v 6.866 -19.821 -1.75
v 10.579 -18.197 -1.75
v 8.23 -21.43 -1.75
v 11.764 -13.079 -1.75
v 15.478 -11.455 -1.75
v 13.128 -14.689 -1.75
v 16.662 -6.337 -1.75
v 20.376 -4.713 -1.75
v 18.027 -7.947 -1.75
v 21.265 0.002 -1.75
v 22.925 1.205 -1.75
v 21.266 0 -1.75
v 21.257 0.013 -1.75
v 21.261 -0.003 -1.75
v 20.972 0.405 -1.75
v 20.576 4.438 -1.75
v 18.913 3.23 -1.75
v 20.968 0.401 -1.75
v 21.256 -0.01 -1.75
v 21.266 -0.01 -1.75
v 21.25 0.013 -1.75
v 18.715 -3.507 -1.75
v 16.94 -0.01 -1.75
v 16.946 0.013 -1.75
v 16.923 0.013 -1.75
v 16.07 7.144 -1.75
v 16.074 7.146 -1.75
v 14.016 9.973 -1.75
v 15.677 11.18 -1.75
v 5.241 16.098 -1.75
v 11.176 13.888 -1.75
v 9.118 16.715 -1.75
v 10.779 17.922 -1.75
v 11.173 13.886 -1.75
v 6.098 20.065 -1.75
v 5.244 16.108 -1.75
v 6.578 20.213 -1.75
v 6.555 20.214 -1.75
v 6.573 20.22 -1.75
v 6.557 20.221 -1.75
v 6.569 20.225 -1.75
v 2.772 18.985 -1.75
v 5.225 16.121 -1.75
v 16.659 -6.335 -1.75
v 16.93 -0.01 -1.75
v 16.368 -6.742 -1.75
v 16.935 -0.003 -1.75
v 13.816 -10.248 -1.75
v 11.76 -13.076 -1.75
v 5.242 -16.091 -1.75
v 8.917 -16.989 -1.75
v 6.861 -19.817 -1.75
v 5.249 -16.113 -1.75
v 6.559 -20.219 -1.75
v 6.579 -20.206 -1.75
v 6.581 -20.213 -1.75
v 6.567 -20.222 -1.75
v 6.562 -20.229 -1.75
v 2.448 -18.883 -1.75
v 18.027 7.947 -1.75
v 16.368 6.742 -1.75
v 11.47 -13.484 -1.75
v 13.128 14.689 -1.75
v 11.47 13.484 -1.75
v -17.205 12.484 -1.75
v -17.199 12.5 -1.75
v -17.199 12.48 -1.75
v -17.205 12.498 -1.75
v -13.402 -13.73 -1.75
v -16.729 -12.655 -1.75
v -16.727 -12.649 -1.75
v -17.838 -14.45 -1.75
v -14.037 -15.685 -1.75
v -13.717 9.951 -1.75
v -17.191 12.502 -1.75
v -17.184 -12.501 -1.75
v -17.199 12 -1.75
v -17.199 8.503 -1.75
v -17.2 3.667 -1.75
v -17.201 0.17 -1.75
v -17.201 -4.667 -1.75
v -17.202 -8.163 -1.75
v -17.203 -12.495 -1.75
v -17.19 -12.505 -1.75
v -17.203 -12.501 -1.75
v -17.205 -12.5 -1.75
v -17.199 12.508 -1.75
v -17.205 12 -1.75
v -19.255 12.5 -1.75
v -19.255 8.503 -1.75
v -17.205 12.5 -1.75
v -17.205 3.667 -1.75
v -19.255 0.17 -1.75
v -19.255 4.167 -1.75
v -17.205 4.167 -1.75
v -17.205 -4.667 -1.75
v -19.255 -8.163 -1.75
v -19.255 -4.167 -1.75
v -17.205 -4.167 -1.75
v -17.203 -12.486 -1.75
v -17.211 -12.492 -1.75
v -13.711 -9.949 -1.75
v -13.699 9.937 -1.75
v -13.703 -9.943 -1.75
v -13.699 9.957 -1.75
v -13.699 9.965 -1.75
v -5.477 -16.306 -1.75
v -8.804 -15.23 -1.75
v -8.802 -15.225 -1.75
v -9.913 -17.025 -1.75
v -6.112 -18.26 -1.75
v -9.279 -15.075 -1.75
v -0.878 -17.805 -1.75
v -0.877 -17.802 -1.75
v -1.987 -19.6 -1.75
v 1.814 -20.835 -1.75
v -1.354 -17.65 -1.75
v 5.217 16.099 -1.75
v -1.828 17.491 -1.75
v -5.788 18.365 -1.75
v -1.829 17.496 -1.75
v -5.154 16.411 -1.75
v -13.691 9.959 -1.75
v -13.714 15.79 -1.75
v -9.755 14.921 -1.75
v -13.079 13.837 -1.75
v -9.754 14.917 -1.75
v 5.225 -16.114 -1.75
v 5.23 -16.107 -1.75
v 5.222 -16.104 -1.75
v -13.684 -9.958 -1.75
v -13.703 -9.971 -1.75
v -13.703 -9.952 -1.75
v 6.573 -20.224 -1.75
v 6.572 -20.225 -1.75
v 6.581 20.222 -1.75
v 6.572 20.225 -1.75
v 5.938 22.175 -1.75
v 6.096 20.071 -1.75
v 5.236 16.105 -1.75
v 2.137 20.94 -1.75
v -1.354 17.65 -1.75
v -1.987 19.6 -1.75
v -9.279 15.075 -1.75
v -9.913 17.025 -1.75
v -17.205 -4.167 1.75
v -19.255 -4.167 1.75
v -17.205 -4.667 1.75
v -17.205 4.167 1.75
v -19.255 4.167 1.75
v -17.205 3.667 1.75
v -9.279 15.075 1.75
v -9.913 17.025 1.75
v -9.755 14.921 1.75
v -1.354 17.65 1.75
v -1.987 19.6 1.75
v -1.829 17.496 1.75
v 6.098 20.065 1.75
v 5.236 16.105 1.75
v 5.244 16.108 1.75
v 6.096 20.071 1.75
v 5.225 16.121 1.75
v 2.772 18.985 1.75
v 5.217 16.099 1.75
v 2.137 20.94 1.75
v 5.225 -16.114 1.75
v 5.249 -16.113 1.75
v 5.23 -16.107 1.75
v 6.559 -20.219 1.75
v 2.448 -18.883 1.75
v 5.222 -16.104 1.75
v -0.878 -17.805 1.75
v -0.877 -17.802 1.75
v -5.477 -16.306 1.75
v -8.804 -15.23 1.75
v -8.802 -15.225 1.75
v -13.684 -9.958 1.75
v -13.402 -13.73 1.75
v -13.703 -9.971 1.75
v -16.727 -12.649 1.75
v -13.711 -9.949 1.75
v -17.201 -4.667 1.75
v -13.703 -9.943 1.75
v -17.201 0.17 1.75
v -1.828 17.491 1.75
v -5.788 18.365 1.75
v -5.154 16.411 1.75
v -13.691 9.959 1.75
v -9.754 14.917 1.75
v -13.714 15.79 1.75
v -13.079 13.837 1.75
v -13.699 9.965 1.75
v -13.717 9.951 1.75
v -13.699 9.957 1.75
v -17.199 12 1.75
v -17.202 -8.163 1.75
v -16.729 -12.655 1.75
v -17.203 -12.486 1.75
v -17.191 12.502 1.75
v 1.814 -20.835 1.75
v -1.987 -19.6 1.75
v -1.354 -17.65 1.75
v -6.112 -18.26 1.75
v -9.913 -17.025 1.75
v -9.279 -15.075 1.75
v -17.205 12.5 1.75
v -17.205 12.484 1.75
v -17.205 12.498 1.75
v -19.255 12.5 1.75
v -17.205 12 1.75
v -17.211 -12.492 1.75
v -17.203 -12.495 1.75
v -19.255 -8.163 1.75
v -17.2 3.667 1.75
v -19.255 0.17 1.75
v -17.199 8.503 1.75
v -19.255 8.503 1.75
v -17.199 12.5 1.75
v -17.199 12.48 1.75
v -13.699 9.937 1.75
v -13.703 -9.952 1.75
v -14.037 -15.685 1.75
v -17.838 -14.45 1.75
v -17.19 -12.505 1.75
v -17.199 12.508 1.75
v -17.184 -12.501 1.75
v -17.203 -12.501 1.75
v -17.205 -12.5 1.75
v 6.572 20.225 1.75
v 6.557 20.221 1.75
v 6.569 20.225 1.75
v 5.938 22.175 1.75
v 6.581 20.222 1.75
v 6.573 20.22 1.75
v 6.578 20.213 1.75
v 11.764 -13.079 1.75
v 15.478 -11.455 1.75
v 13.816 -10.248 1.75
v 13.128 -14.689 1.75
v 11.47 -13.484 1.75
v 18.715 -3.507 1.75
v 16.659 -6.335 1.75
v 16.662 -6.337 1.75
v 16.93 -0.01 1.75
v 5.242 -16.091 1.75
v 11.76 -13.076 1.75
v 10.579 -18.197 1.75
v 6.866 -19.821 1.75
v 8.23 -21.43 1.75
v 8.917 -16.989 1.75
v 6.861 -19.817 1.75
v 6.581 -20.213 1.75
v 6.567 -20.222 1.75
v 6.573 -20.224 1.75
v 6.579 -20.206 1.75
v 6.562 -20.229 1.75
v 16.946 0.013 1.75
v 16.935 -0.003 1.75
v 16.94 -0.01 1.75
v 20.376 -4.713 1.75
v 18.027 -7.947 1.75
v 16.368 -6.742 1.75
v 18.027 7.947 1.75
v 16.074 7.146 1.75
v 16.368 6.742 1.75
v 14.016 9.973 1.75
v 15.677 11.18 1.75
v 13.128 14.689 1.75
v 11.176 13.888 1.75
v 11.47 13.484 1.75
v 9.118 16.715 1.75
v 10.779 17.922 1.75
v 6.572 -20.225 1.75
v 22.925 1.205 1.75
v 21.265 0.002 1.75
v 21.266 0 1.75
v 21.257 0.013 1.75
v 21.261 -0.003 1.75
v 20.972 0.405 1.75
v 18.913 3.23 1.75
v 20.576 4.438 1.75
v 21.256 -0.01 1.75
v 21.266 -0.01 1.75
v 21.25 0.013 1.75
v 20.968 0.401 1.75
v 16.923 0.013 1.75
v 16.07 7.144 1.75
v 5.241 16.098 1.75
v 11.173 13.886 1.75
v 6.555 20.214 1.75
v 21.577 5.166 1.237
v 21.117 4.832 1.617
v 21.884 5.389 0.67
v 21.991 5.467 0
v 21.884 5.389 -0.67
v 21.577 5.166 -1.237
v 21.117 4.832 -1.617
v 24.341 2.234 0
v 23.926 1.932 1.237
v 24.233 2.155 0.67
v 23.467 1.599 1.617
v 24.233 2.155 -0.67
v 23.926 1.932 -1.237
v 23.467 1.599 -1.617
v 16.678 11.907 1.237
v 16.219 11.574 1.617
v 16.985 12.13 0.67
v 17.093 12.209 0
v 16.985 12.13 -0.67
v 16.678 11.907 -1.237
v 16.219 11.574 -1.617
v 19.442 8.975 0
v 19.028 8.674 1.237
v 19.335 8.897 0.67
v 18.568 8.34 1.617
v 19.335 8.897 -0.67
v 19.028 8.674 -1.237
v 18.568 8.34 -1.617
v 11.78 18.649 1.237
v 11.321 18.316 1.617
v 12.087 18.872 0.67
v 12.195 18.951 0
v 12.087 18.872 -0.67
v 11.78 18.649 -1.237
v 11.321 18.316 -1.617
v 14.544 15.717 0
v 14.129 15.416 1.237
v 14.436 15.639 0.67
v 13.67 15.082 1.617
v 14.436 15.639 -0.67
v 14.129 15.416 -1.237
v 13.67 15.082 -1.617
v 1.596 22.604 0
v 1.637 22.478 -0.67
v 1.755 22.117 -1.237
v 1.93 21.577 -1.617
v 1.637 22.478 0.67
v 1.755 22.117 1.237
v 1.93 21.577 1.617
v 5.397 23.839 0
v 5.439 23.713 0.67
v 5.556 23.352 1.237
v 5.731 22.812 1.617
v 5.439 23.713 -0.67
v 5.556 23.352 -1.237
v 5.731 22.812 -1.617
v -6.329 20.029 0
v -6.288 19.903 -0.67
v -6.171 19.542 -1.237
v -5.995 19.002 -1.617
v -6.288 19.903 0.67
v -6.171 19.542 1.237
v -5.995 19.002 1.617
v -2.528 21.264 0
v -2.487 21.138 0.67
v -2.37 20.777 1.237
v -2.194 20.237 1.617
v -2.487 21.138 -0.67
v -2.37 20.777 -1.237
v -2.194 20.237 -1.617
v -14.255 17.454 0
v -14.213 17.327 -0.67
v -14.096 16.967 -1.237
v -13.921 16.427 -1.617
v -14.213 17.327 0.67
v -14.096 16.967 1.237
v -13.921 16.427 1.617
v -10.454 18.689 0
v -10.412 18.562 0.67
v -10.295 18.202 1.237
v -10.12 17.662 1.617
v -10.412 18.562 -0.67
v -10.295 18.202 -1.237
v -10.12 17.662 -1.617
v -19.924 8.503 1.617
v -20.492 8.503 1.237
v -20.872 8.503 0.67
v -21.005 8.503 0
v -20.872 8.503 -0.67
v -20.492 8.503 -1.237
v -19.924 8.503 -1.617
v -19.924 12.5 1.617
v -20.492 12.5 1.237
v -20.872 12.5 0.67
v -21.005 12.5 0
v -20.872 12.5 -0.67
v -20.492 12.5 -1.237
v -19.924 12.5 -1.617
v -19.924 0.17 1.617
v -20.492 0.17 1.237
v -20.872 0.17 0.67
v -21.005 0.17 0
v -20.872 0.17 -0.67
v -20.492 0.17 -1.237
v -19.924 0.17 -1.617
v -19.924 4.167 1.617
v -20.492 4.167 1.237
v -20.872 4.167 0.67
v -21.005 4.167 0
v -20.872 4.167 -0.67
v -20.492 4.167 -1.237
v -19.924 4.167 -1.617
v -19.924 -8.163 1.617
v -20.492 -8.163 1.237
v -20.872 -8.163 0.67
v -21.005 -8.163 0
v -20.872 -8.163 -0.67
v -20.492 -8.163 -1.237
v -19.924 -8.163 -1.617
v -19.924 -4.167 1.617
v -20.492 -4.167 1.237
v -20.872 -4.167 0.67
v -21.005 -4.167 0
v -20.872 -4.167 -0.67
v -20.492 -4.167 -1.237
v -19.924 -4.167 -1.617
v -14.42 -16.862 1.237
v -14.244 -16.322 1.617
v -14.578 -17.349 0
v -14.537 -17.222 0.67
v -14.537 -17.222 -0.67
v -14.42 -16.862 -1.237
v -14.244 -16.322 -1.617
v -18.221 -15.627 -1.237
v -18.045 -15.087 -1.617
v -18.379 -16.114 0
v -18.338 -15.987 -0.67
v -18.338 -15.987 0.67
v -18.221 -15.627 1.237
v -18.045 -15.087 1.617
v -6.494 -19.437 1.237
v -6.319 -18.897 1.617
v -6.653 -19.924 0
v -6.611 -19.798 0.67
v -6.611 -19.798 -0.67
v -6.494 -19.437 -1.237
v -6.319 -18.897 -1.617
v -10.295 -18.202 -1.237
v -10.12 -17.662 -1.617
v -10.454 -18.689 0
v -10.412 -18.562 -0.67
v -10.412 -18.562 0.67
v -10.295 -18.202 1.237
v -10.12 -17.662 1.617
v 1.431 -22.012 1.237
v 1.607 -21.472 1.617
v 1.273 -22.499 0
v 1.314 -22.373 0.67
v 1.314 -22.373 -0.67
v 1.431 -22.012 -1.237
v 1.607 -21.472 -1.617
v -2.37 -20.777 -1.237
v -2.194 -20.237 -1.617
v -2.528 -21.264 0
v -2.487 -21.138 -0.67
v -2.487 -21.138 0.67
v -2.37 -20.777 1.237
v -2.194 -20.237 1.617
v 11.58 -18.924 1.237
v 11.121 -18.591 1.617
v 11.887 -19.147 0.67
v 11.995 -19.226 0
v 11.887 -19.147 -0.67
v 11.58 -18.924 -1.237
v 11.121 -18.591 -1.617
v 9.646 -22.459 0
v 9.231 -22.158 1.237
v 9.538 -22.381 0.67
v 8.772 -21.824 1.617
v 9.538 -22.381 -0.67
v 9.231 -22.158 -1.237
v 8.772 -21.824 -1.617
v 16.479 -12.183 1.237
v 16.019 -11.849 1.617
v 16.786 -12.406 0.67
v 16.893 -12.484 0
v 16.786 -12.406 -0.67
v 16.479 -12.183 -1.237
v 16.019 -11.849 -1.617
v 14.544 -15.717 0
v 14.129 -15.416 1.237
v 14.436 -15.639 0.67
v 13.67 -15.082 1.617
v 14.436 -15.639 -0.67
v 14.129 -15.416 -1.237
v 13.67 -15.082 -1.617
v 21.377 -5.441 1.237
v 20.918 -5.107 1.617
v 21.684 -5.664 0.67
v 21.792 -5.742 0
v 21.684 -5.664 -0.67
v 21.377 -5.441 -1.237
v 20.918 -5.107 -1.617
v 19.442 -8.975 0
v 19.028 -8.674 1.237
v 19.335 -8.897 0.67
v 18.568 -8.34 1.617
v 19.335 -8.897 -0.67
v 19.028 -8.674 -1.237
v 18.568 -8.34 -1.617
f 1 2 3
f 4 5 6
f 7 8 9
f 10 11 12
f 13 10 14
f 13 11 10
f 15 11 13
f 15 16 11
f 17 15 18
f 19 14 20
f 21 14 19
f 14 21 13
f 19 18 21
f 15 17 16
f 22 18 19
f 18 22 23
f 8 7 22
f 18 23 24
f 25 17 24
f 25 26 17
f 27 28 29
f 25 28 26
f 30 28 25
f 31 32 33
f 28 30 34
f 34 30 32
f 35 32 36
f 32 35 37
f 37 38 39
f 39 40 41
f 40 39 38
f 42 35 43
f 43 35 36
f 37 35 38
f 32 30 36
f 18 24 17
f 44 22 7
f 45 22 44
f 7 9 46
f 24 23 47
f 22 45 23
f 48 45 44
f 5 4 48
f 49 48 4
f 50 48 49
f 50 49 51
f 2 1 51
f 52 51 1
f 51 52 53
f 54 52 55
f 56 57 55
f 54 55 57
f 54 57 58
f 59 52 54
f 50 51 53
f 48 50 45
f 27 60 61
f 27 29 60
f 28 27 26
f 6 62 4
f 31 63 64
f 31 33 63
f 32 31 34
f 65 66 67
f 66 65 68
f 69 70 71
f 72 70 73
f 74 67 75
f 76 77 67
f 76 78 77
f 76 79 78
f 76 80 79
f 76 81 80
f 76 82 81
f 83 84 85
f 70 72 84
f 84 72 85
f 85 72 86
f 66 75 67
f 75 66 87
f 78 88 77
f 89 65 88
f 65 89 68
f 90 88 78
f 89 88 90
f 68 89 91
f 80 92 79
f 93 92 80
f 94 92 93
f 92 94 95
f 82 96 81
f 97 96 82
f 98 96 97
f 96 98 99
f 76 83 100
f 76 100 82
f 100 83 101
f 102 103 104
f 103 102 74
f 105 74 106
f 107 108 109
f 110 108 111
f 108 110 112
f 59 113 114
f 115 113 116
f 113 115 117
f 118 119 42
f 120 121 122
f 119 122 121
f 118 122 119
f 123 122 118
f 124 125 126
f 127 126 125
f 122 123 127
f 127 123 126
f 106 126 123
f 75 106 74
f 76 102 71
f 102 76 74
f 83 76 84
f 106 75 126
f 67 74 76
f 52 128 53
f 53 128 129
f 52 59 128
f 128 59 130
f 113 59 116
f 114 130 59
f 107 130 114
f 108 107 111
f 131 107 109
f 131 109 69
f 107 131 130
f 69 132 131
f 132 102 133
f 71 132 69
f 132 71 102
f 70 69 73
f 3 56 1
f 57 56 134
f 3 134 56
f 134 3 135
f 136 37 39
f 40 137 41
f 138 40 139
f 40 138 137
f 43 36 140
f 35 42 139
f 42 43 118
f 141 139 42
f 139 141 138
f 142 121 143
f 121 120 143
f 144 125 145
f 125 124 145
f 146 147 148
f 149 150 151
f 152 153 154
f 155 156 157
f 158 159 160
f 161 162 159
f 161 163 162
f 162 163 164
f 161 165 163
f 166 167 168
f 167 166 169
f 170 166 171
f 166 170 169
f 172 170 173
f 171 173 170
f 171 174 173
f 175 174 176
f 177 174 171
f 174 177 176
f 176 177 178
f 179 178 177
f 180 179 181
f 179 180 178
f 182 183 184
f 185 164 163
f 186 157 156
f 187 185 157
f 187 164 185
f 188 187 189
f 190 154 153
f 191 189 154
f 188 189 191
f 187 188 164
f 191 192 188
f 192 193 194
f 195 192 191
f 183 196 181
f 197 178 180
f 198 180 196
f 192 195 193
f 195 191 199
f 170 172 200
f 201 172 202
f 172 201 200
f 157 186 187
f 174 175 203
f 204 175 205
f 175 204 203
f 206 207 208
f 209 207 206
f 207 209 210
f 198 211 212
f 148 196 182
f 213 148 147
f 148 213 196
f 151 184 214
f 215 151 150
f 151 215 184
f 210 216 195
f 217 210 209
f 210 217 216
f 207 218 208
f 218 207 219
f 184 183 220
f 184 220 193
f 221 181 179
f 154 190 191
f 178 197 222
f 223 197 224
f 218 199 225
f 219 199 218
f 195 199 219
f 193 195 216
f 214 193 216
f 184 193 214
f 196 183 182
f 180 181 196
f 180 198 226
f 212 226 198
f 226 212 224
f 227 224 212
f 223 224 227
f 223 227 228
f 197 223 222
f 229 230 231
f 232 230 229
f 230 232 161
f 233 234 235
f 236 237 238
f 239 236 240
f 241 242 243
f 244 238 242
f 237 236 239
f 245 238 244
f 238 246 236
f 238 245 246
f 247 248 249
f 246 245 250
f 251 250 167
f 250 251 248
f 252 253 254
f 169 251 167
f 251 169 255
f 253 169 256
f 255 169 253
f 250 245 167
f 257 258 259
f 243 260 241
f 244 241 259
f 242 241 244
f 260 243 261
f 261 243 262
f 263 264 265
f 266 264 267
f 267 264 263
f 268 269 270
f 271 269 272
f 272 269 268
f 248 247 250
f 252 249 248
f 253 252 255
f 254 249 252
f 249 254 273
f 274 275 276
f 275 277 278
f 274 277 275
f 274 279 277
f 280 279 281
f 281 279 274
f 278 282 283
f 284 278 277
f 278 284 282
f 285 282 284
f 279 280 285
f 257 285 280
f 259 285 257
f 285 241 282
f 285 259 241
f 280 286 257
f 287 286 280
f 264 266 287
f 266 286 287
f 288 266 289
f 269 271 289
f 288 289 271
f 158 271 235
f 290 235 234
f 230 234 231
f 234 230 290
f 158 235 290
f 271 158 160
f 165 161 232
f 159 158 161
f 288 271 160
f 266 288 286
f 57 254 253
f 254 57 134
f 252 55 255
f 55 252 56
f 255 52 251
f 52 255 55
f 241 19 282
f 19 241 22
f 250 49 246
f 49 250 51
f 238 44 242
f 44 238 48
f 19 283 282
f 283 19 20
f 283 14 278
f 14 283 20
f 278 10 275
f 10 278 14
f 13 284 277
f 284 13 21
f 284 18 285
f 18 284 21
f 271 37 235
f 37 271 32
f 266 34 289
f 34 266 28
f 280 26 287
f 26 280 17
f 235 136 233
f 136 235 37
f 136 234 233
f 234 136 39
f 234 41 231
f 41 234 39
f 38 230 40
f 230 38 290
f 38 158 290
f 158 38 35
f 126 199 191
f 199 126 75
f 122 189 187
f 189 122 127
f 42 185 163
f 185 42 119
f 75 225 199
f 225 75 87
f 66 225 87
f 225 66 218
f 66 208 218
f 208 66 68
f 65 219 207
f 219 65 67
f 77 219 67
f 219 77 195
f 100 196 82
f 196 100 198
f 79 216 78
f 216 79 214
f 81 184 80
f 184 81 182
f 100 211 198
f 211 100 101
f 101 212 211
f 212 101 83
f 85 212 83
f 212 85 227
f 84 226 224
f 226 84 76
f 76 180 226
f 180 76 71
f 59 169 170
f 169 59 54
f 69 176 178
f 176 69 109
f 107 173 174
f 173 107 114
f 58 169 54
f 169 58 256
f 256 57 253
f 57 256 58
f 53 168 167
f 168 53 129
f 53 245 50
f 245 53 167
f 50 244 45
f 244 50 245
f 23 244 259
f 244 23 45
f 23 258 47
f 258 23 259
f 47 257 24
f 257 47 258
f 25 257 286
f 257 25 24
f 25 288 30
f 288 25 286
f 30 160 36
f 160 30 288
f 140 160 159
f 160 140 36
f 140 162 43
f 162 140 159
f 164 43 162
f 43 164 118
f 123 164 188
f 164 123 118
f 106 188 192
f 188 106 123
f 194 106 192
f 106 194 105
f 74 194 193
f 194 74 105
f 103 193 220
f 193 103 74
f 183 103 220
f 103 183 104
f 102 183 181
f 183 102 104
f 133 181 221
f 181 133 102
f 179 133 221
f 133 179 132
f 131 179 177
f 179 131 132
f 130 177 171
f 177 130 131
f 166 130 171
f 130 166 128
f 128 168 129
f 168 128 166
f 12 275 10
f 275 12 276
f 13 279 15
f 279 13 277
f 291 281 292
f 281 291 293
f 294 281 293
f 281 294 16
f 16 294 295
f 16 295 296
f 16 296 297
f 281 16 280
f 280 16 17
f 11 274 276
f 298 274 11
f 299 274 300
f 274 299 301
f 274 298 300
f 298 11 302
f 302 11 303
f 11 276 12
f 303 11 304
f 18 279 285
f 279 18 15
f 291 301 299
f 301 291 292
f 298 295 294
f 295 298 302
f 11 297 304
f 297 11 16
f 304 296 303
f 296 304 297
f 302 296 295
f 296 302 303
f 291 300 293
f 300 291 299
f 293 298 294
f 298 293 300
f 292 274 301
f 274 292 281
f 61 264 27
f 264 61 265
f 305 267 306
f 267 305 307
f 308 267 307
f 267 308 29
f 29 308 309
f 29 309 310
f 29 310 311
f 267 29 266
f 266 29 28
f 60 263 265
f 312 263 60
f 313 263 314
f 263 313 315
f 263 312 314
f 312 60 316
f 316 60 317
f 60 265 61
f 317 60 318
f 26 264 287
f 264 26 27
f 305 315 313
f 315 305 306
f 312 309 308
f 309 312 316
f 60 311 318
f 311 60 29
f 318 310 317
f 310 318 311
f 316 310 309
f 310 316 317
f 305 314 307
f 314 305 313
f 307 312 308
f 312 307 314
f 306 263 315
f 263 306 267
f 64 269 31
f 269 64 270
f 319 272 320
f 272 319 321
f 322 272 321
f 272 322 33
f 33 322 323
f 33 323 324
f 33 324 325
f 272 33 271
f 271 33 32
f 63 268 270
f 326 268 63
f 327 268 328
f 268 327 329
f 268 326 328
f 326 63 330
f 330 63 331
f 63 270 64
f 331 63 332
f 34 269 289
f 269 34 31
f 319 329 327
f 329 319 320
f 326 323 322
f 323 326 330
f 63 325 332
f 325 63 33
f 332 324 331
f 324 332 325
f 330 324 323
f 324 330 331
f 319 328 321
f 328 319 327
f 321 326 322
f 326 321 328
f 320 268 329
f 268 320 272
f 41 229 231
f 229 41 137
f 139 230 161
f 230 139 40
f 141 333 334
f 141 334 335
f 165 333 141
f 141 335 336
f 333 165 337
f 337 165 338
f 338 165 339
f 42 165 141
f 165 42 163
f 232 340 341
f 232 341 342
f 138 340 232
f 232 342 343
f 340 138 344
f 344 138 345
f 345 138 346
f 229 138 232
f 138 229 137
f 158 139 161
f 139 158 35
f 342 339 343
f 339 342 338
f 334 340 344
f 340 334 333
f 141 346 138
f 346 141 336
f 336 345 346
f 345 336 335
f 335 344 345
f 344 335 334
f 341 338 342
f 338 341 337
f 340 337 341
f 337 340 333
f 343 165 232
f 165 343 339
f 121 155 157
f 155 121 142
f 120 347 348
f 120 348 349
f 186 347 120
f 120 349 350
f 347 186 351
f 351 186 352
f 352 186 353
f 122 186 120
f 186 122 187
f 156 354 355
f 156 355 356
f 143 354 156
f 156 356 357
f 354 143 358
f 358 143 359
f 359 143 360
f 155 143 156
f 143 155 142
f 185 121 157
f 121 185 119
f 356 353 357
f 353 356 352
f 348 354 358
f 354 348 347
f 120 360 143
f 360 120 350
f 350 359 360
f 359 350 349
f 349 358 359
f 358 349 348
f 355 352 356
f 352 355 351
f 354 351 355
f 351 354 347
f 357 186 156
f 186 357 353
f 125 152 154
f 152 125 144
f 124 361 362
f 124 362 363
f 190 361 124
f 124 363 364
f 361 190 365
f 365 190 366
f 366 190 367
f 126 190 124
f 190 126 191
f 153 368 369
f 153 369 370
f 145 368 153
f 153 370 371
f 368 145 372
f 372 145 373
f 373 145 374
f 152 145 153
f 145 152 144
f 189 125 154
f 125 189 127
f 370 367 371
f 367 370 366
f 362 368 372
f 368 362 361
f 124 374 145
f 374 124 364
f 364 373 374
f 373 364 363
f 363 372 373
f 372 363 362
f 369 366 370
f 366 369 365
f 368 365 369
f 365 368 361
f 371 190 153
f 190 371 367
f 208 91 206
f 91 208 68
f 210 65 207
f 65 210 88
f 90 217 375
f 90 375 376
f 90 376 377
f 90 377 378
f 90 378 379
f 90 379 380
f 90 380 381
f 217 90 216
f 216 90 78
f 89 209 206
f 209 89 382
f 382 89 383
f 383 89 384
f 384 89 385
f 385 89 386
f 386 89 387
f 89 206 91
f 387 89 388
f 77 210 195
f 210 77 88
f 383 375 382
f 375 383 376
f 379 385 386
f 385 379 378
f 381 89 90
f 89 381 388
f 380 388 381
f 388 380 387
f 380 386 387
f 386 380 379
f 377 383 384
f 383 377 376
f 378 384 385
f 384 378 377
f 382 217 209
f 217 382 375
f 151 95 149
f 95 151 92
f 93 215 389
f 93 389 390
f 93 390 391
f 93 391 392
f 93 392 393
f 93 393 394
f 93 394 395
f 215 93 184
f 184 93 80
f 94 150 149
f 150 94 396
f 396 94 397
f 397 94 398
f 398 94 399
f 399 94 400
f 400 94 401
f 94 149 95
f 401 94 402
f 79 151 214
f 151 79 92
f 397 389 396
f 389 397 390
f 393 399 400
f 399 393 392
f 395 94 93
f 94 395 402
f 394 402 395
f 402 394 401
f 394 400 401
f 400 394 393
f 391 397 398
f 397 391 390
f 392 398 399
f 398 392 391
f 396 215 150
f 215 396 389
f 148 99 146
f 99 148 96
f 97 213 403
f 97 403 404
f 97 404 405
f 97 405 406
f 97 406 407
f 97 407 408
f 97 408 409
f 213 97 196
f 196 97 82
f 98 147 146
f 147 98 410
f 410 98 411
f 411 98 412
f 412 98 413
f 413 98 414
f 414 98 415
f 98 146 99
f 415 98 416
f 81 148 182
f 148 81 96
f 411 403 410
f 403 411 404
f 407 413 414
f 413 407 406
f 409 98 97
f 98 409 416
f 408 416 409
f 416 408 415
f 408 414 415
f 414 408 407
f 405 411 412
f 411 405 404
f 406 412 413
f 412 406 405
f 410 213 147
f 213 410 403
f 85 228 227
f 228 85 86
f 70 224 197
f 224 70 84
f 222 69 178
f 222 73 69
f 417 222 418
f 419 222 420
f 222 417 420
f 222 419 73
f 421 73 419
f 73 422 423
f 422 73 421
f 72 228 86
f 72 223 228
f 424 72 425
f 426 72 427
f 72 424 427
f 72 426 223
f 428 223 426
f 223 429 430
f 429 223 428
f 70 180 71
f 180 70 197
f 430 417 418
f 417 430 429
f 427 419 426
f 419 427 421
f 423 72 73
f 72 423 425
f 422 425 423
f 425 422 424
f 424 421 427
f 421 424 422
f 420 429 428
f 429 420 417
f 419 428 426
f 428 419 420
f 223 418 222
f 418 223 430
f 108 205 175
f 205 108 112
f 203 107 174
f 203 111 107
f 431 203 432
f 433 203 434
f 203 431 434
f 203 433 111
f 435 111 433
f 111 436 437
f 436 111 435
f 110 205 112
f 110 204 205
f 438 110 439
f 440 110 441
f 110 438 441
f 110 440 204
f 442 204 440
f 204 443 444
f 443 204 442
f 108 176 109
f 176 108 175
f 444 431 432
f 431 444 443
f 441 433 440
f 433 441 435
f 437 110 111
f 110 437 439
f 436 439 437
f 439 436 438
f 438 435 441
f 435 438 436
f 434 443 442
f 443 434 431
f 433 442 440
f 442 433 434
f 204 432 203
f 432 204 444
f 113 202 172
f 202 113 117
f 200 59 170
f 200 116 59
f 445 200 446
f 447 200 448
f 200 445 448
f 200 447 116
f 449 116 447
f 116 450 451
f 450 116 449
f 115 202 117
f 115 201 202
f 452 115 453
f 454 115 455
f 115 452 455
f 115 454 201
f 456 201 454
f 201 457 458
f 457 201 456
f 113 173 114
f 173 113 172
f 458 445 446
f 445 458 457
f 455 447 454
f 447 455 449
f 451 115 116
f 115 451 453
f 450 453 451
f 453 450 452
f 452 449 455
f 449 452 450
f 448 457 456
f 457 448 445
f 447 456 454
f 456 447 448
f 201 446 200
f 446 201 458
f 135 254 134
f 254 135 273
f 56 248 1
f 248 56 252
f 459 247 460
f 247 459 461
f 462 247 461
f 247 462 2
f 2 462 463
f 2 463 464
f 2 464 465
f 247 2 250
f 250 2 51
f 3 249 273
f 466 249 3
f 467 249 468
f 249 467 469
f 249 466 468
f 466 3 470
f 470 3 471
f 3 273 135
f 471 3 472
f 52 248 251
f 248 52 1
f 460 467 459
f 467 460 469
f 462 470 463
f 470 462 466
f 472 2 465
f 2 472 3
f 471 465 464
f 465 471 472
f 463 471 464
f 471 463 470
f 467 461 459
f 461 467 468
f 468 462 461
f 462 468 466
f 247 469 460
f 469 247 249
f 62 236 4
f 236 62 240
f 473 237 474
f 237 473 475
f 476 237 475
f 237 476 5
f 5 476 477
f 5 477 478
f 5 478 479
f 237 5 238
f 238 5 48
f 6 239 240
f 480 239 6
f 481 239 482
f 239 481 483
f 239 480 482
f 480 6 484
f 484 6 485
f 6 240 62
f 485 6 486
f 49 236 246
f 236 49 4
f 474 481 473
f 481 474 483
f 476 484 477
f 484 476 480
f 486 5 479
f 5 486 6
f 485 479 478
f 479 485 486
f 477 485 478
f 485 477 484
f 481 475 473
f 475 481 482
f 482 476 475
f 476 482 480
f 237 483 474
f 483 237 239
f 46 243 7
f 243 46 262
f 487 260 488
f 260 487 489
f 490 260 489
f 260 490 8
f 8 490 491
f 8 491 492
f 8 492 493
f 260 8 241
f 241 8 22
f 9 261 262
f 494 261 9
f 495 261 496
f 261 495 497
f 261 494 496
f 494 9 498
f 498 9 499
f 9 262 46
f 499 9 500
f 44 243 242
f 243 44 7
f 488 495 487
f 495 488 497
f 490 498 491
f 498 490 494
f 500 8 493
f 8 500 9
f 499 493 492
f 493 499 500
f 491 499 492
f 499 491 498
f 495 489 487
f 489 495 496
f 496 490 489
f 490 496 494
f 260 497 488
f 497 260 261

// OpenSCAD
// mathgrrl polysnap tiles

// AS SUBMITTED TO THINGIVERSE CUSTOMIZER - DO NOT MODIFY THIS COPY

//////////////////////////////////////////////////////////////////////////
// PARAMETERS ////////////////////////////////////////////////////////////

/* [Shape] */

// Choose the number of sides for the tile
sides = 5; // [3,4,5,6,7,8,9,10,11,12]

// Choose the number of snaps on each side
snaps = 3; // [2,3,4,5,6,7,8]

/* [Size] */

// Set the length of each side, in mm
side_length = 25; 

// Set the thickness of the tile, in mm
thickness = 3.5;

// Set the border thickness, in mm
border = 3.5;	

/* [Adjust Fit] */

// Add extra space between snaps, in mm
clearance = .17;

// Add extra length to the snaps, in mm
lengthen = .3;

//radius depends on side length
radius = side_length/(2*sin(180/sides)); 

//inside radius depends on the border thickness
inside = radius-border/(cos(180/sides)); 

//width of each snap depends on number of snaps	
snapwidth = radius*sin(180/sides)/snaps;

//////////////////////////////////////////////////////////////////////////
// RENDERS ///////////////////////////////////////////////////////////////

union(){
	//make the polygon base
	poly_maker(); 									
	
	//make the snaps
	snap_maker();	
}

//////////////////////////////////////////////////////////////////////////
// MODULES ///////////////////////////////////////////////////////////////

//build the polygon shape of the tile
//shape is made up of n=sides wedges that are rotated around
module poly_maker(){

	//subtract the smaller polygon from the larger polygon
	difference(){

		//extrude to thicken the polygon
		linear_extrude(height=thickness,center=true){ 

			//rotate the wedge n=sides times at angle of 360/n each time
			for(i=[0:sides]){

				//rotation is around the z-axis [0,0,1]
				rotate(i*360/sides,[0,0,1])	

					//make triangular wedge with angle based on number of sides
					polygon(

						//the three vertices of the triangle
						points =	[[0-.1,0-.1], //tweaks fix CGAL errors
									 [radius,0-.01],
									 [radius*cos(360/sides)-.01,radius*sin(360/sides)+.01]],

						//the order to connect the three vertices above
						paths = [[0,1,2]]
					);
			}
		}
		//extrude to thicken the center polygon that will be the hole
		linear_extrude(height=thickness+2,center=true){ 

			//rotate the wedge n=sides times at angle of 360/n each time			
			for(i=[0:sides]){

				//rotation is around the z-axis [0,0,1]
				rotate(i*360/sides,[0,0,1])	

					//make triangular wedge with angle based on number of sides
					polygon(

						//the three vertices of the triangle
						points =	[[0-.2,0-.2], //tweaks fix CGAL errors
									 [inside,0-.01],
									 [inside*cos(360/sides)-.01,inside*sin(360/sides)+.01]],

						//the order to connect the three vertices above
						paths = [[0,1,2]]
					);
			}
		}
	}
}

//build the snaps around the tile
//try the commands alone with i=1 and i=2 to see how this works
//remember to read from the bottom to the top to make sense of this
module snap_maker(){

	//rotate the side of snaps n=sides times at angle of 360/n each time
	for(i=[0:sides]){ 

		//rotation is around the z-axis [0,0,1]
		rotate(i*360/sides,[0,0,1]) 	

			//build snaps for first side at the origin and move into positions
			for(i=[0:snaps-1]){	

				//read the rest of the commands from bottom to top
				//translate the snap to the first side
				translate([radius,0,-thickness/2]) 

					//rotate the snap to correct angle for first side
					rotate(180/sides) 

						//for i^th snap translate 2*i snapwidths over from origin
						translate([0,2*i*snapwidth,0]) 

							//rounded box for snap made from a box and cylinder
							union(){

								//cube part of snap shape at the origin
								cube([thickness/2+lengthen,snapwidth-clearance,thickness]);

								//post at back of snap to avoid loose teeth
								//shifted a bit right to avoid overhangs when sides=3
								translate([-.5,.5,0])
									cube([thickness/2,snapwidth-clearance-.5,thickness]);
	
								//round part of snap shape at the origin
								//move cylinder to the end of the box
								translate([thickness/2+lengthen,snapwidth-clearance,thickness/2])

									//rotate cylinder to match box orientation
									rotate(90,[0,1,0]) 
										rotate(90,[1,0,0]) 

											//cylinder of the correct size to match box
											cylinder(	
												r=thickness/2,
												h=snapwidth-clearance,
												$fn=16  //number of sides
											);
							}
			}
	}
}
